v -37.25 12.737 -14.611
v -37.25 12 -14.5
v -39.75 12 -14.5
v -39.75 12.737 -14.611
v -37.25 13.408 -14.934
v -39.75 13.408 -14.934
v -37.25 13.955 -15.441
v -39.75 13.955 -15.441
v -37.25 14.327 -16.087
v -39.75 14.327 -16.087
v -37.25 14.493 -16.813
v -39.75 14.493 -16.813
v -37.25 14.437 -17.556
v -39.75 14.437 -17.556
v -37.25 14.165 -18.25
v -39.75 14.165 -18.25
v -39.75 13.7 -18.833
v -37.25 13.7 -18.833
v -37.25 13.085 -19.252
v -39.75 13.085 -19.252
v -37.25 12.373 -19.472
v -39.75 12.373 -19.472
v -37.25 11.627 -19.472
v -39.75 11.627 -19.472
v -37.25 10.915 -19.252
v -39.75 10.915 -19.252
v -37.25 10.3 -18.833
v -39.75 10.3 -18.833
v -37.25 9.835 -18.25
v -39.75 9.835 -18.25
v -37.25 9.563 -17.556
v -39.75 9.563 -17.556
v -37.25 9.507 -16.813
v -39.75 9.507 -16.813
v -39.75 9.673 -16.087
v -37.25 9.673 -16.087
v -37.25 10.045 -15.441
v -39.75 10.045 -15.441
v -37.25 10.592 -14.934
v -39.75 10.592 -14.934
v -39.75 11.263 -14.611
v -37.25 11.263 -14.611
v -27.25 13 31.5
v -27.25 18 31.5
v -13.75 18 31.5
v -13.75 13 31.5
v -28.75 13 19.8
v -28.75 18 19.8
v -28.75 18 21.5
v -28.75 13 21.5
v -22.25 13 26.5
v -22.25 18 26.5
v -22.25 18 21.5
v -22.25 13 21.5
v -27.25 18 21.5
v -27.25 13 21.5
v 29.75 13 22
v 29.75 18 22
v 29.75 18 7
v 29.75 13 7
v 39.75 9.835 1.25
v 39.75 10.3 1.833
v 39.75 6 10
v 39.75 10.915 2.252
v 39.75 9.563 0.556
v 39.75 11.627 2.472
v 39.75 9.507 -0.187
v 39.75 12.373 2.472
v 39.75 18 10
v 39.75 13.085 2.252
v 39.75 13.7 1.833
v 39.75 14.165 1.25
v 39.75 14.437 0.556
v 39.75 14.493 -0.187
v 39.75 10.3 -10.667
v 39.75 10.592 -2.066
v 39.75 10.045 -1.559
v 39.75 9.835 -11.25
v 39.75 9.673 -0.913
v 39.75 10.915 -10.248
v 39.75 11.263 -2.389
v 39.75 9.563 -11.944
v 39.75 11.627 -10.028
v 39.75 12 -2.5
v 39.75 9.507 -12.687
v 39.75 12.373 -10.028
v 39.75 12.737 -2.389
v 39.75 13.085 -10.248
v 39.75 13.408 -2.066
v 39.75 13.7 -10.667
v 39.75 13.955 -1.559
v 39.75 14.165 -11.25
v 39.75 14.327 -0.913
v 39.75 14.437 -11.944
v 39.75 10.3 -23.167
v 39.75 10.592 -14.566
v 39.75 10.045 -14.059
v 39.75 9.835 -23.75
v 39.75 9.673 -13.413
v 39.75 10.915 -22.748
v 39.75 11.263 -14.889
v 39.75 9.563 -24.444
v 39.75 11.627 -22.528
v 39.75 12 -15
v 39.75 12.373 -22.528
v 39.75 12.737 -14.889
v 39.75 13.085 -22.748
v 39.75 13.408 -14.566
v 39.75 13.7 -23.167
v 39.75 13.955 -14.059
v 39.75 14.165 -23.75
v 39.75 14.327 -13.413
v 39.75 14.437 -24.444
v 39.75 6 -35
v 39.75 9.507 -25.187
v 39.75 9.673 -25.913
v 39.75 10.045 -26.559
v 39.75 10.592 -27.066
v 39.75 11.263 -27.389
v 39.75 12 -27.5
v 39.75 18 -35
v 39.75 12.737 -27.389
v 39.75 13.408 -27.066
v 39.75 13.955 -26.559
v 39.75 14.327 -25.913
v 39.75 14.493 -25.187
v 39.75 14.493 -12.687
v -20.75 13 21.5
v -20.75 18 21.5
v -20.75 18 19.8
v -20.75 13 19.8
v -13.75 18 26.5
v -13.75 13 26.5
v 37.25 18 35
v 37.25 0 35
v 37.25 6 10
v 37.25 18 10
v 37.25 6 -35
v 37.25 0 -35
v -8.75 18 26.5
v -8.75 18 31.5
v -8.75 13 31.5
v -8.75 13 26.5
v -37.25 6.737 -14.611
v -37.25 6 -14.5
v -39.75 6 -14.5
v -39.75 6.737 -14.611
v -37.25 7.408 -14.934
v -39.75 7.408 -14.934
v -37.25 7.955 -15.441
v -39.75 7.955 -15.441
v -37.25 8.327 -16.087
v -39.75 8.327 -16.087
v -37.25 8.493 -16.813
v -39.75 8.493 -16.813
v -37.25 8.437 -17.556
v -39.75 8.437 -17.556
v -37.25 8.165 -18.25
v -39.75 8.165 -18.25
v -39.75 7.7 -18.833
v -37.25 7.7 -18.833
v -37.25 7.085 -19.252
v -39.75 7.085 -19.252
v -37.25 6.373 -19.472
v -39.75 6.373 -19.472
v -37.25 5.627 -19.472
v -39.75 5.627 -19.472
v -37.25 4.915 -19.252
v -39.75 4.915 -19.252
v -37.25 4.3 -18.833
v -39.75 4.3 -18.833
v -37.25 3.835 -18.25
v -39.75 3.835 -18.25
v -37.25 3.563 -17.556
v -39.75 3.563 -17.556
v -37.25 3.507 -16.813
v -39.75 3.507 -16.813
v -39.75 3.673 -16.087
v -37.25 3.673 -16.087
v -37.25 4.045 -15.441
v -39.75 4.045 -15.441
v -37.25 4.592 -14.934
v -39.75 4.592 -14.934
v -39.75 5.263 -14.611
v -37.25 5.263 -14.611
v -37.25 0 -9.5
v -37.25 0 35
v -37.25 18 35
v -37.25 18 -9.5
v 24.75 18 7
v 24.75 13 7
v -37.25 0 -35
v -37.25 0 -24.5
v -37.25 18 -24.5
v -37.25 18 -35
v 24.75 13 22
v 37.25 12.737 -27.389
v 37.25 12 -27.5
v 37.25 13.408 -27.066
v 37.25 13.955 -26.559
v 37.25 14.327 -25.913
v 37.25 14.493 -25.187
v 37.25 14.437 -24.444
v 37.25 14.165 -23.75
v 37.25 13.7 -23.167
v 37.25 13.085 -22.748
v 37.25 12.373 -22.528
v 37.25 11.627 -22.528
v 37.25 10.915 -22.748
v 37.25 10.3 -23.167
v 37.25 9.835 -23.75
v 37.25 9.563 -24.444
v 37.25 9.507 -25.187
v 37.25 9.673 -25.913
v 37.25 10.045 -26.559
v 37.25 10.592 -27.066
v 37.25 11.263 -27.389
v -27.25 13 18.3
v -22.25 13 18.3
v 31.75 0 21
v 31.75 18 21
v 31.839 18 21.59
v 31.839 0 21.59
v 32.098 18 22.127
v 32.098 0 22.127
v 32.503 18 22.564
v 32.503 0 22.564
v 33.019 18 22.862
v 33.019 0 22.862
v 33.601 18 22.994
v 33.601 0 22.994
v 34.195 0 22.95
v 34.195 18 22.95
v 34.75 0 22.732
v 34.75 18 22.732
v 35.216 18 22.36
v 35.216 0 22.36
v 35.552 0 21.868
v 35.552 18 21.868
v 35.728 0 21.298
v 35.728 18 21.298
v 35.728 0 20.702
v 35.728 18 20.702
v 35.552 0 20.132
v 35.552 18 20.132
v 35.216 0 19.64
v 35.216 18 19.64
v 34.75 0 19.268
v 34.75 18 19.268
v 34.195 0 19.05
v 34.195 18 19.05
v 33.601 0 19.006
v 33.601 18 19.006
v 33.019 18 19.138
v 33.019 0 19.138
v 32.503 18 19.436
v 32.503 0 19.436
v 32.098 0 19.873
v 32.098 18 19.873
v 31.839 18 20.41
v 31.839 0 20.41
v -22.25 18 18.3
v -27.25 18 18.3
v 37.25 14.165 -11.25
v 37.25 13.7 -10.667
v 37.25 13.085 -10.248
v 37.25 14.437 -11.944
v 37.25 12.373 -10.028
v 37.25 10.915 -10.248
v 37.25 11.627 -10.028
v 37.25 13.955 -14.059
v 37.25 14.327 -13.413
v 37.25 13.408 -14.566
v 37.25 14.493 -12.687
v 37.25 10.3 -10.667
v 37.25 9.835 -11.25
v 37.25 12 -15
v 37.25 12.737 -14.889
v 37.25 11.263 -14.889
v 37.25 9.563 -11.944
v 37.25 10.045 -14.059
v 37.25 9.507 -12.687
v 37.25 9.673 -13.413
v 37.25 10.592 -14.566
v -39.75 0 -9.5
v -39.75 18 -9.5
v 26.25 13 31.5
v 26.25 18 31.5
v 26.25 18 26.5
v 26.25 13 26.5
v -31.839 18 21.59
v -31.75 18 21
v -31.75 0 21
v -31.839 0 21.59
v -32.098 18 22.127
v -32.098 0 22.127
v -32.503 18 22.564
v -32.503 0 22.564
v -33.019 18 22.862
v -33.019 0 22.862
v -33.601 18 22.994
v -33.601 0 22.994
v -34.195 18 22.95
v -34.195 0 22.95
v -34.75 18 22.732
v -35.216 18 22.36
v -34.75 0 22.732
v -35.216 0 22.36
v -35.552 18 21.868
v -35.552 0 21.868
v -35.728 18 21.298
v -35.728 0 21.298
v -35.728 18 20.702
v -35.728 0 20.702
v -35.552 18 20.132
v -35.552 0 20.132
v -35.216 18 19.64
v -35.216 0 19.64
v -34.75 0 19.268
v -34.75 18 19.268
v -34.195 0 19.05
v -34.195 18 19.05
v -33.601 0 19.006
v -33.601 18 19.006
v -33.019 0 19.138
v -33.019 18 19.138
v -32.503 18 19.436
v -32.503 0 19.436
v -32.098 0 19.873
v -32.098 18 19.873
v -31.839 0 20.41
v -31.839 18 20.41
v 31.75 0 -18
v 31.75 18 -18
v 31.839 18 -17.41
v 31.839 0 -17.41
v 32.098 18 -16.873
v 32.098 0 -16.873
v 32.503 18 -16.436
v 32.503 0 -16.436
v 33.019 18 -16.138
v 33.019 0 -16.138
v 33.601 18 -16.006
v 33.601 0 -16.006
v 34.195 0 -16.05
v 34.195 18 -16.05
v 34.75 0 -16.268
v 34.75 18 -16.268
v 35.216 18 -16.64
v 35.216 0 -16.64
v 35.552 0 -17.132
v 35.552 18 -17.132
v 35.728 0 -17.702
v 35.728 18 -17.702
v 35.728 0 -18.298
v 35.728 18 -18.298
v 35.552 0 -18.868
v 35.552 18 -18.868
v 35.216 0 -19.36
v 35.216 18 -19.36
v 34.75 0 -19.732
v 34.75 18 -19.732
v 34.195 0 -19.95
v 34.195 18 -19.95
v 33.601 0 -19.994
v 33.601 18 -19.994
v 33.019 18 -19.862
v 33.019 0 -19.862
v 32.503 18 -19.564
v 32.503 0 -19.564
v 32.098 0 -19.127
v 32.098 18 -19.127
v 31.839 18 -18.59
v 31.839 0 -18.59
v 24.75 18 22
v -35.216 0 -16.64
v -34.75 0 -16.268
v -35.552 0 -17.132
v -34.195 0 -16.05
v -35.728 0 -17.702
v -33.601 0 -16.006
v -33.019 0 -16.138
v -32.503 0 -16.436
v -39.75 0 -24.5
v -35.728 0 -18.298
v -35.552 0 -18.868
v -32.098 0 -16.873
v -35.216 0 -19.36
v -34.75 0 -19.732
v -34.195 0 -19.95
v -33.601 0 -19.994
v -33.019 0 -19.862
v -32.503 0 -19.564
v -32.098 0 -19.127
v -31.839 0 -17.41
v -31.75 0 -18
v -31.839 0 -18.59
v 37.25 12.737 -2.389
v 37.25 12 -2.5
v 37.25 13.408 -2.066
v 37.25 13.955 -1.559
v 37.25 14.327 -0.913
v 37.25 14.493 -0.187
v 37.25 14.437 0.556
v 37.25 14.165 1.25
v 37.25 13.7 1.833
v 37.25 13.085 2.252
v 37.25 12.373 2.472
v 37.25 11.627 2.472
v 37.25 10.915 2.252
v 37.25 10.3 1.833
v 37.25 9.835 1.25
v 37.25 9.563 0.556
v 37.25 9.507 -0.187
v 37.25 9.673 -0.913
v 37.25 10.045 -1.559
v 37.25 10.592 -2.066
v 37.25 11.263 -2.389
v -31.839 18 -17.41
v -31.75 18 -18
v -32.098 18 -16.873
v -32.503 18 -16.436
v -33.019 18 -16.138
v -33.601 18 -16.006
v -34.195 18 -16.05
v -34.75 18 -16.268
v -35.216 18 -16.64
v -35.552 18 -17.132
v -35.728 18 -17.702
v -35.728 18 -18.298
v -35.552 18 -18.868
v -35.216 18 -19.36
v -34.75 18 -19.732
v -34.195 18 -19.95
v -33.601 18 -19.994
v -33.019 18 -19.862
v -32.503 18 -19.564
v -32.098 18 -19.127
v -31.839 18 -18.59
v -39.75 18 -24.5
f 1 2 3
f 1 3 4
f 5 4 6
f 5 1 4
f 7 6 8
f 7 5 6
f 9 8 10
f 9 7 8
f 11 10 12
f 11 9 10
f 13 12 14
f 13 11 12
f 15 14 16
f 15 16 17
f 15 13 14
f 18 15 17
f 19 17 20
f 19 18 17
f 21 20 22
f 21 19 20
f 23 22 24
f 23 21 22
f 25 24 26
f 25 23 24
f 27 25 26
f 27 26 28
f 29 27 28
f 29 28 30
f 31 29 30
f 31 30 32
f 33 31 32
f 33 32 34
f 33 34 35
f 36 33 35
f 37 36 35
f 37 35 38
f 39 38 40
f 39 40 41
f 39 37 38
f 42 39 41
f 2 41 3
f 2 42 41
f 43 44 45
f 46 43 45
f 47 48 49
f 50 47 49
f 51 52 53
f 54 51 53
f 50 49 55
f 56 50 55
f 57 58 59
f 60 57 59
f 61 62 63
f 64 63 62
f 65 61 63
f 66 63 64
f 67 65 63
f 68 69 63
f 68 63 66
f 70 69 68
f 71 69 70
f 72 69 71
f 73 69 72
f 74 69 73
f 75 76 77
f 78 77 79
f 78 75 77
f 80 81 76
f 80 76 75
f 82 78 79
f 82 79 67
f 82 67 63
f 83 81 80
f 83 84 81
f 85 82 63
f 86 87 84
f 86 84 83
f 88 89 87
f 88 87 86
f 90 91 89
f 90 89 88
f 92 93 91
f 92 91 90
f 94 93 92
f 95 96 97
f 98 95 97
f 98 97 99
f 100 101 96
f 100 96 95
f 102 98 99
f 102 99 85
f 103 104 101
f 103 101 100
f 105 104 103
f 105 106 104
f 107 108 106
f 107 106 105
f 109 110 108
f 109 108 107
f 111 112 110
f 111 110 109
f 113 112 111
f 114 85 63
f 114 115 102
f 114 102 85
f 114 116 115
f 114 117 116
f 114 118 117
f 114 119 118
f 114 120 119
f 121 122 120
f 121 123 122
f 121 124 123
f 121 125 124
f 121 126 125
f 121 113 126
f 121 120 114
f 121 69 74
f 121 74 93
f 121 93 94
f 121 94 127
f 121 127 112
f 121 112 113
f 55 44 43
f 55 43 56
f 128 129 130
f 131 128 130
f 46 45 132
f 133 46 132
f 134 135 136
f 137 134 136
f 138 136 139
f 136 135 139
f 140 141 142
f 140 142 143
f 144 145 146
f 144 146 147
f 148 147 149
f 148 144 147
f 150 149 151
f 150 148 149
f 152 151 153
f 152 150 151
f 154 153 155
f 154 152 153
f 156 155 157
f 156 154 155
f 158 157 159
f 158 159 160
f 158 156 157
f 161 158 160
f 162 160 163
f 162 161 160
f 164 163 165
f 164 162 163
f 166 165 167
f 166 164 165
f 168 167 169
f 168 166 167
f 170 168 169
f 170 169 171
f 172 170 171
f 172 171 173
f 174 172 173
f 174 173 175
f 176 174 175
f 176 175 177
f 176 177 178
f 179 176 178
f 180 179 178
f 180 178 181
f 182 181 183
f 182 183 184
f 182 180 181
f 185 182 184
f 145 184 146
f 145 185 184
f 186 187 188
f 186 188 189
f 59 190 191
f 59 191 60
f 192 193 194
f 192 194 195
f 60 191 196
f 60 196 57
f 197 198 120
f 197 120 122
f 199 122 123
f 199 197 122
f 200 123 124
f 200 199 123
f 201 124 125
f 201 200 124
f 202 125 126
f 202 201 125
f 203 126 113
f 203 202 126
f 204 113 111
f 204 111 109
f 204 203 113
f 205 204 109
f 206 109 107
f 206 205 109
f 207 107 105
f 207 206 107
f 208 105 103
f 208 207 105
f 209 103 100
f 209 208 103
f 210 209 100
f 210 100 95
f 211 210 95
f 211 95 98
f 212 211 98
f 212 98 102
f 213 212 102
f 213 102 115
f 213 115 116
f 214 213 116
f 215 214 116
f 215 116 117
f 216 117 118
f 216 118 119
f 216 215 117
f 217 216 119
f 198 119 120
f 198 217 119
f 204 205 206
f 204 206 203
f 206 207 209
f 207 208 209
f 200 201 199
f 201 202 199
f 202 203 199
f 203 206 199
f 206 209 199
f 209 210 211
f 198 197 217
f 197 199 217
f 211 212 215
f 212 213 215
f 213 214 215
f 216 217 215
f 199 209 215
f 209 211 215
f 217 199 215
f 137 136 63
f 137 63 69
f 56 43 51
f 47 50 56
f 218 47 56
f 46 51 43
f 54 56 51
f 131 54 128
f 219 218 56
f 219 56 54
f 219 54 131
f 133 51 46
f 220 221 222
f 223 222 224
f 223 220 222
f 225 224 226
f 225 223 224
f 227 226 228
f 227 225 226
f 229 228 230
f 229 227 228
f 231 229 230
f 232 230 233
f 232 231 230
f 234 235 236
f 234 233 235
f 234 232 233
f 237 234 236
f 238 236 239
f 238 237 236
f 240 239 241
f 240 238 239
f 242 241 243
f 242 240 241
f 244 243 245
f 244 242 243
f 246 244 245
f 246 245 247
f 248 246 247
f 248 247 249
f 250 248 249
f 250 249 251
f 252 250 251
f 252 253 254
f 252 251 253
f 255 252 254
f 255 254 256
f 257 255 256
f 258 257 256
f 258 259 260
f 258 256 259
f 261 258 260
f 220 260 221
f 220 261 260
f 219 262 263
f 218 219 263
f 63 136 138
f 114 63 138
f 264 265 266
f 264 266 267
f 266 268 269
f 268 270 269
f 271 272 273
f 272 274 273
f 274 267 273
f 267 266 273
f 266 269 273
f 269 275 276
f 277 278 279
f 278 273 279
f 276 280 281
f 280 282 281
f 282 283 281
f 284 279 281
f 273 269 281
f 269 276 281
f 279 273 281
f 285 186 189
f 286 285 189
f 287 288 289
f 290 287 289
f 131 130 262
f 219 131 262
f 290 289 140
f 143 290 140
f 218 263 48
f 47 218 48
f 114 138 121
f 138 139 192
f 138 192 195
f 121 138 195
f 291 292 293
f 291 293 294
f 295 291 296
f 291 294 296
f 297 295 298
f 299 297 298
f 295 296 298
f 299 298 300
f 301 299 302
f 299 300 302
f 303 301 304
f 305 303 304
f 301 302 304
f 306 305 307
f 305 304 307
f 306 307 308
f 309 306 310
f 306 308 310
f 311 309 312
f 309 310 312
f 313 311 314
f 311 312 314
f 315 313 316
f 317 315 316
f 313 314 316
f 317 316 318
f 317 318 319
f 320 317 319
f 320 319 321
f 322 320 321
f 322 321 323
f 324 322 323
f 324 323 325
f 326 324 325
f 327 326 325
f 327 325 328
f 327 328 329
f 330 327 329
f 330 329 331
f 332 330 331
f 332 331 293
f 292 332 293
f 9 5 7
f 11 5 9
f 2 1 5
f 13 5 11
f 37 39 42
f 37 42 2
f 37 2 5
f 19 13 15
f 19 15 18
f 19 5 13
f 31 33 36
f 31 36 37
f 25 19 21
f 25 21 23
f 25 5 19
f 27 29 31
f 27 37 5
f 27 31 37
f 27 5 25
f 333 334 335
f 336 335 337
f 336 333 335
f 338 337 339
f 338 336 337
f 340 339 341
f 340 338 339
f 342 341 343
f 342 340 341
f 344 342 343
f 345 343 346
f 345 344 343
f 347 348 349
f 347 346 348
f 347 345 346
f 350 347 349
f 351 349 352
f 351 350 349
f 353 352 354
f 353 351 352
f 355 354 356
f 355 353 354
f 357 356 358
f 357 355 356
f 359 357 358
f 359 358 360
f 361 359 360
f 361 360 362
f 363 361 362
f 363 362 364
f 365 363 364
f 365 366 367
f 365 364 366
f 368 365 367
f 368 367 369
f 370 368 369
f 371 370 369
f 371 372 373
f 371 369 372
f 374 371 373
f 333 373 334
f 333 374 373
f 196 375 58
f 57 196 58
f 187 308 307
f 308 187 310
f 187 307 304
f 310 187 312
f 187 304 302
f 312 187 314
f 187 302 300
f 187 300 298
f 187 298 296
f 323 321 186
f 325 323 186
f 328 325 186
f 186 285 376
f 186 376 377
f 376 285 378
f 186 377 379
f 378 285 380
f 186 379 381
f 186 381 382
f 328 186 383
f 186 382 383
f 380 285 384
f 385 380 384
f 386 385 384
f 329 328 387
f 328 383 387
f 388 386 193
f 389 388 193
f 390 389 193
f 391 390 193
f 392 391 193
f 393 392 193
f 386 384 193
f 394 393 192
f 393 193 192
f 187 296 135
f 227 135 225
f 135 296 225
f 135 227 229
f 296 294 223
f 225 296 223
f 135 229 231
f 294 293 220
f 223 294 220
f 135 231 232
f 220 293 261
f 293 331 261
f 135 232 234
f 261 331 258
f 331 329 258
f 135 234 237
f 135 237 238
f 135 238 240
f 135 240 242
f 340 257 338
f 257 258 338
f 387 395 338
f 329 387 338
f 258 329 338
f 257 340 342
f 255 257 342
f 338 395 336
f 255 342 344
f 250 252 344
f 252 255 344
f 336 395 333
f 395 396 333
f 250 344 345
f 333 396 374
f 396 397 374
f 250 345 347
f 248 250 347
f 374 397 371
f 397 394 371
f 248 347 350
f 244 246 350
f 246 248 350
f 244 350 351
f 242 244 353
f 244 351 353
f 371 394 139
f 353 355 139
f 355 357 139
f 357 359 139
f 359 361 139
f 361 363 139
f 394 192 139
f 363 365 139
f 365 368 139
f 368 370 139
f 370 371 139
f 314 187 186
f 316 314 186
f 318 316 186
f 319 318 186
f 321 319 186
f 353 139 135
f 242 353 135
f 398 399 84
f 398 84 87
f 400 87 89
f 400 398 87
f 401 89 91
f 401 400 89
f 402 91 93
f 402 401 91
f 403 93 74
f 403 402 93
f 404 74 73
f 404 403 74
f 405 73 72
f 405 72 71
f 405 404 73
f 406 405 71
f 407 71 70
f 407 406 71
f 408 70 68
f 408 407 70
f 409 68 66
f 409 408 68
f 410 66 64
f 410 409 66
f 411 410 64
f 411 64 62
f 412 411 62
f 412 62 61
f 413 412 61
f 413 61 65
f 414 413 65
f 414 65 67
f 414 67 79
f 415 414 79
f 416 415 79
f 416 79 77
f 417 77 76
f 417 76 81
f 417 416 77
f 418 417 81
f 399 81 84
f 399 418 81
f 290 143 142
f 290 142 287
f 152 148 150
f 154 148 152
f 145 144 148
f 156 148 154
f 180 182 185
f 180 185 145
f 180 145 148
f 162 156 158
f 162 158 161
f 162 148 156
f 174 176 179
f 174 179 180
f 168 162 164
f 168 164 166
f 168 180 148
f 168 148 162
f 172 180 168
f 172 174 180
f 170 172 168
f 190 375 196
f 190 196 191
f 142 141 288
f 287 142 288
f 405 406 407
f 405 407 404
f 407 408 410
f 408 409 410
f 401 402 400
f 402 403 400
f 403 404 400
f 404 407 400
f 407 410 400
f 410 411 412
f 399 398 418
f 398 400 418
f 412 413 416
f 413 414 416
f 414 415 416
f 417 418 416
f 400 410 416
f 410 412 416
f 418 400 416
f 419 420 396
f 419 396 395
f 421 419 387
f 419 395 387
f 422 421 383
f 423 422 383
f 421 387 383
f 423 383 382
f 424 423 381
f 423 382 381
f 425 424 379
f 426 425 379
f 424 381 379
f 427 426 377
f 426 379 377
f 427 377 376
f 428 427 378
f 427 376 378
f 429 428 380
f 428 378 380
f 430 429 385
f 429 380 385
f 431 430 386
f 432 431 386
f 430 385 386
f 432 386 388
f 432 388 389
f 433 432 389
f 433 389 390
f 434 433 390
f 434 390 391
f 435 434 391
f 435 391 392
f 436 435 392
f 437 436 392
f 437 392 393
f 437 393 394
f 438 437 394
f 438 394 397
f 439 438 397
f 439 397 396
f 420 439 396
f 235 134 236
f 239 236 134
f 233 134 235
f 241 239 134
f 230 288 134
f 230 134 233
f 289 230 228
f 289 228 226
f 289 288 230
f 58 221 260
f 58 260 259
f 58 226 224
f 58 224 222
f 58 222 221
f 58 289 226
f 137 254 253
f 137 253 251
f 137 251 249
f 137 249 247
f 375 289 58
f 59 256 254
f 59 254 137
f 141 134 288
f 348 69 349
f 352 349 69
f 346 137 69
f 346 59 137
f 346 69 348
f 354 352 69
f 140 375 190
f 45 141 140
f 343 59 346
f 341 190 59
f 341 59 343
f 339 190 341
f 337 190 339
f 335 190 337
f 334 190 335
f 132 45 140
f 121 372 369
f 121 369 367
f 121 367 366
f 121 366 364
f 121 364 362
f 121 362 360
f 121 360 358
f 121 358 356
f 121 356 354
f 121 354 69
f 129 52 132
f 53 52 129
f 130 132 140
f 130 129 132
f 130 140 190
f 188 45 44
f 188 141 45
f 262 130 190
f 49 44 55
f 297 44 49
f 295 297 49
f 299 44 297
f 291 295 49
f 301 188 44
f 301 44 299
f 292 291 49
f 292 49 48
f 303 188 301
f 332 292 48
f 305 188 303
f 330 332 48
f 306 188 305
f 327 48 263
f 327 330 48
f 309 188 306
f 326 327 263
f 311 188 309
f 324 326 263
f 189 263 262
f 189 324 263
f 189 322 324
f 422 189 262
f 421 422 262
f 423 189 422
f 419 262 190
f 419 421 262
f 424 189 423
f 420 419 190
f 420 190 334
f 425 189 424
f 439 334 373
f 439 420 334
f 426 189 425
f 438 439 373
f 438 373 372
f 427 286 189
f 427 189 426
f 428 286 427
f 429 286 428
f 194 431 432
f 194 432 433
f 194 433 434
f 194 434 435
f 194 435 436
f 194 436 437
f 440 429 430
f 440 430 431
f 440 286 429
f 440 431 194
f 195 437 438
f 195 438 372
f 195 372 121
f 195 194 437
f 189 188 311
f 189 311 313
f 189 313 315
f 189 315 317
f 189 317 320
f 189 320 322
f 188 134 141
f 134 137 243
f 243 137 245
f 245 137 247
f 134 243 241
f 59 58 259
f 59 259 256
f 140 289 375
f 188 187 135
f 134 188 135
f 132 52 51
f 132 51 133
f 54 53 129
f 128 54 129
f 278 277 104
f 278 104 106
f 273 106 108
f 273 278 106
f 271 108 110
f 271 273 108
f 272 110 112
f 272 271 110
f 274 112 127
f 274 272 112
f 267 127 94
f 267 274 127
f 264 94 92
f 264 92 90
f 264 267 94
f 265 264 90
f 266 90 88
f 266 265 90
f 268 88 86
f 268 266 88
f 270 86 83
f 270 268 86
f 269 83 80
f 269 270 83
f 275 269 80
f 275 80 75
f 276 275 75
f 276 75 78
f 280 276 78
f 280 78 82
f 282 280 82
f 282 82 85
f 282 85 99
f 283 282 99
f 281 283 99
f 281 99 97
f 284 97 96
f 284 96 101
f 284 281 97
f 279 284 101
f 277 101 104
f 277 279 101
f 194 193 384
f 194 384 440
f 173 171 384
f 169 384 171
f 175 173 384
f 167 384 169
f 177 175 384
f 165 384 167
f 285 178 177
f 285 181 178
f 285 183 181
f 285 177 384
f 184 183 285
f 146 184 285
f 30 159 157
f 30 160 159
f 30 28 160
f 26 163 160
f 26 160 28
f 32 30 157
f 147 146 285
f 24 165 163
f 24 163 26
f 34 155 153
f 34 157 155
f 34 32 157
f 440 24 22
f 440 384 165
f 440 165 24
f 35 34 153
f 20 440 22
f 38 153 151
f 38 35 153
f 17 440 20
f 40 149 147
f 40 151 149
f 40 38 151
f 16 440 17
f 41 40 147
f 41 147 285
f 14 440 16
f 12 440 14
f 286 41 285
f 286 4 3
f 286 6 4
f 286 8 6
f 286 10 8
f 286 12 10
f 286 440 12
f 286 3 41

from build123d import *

# Parameters (mm, degrees)
SKETCH1_W           = 74.5
SKETCH1_H           = 70
BOSS_EXTRUDE1_DEPTH = 18
SKETCH3_W           = 5
SKETCH3_H           = 10
SKETCH3_W_2         = 8.5
SKETCH3_H_2         = 5
SKETCH3_W_3         = 18.5
SKETCH3_W_4         = 16.5
SKETCH3_H_3         = 15
CUT_EXTRUDE1_DEPTH  = 5
SKETCH4_W           = 45
SKETCH4_H           = 12
SKETCH4_R           = 2.5
BOSS_EXTRUDE2_DEPTH = 2.5
SKETCH5_W           = 15
SKETCH5_H           = 18
SKETCH5_R           = 2.5
BOSS_EXTRUDE3_DEPTH = 2.5
SKETCH6_R           = 2
CUT_EXTRUDE2_DEPTH  = 19


with BuildPart() as part:
    # Sketch1 → Boss-Extrude1 (new body)
    with BuildSketch(Plane(origin=(0, 0, 0), x_dir=(1, 0, 0), z_dir=(0, 1, 0))):
        Rectangle(SKETCH1_W, SKETCH1_H)
    extrude(amount=BOSS_EXTRUDE1_DEPTH)

    # Sketch3 → Cut-Extrude1 (cut)
    with BuildSketch(Plane(origin=(0, 18, 0), x_dir=(1, 0, 0), z_dir=(0, 1, 0))):
        with Locations((-24.75, -26.5)):
            Rectangle(SKETCH3_W, SKETCH3_H)
        with Locations((-18, -29)):
            Rectangle(SKETCH3_W_2, SKETCH3_H_2)
        Polygon((-28.75, -21.5), (-27.25, -21.5), (-22.25, -21.5), (-20.75, -21.5), (-20.75, -19.8), (-22.25, -18.3), (-27.25, -18.3), (-28.75, -19.8), align=None)
        with Locations((0.5, -29)):
            Rectangle(SKETCH3_W_3, SKETCH3_H_2)
        with Locations((18, -29)):
            Rectangle(SKETCH3_W_4, SKETCH3_H_2)
        with Locations((27.25, -14.5)):
            Rectangle(SKETCH3_W, SKETCH3_H_3)
    extrude(amount=-CUT_EXTRUDE1_DEPTH, mode=Mode.SUBTRACT)

    # Sketch4 → Boss-Extrude2 (add)
    with BuildSketch(Plane(origin=(37.25, 0, 0), x_dir=(0, 0, -1), z_dir=(1, 0, 0))):
        with Locations((12.5, 12)):
            Rectangle(SKETCH4_W, SKETCH4_H)
        with Locations((25, 12)):
            Circle(SKETCH4_R, mode=Mode.SUBTRACT)
        with Locations((12.5, 12)):
            Circle(SKETCH4_R, mode=Mode.SUBTRACT)
        with Locations((0, 12)):
            Circle(SKETCH4_R, mode=Mode.SUBTRACT)
    extrude(amount=BOSS_EXTRUDE2_DEPTH)

    # Sketch5 → Boss-Extrude3 (add)
    with BuildSketch(Plane.ZY.offset(37.25)):
        with Locations((-17, 9)):
            Rectangle(SKETCH5_W, SKETCH5_H)
        with Locations((-17, 12)):
            Circle(SKETCH5_R, mode=Mode.SUBTRACT)
        with Locations((-17, 6)):
            Circle(SKETCH5_R, mode=Mode.SUBTRACT)
    extrude(amount=BOSS_EXTRUDE3_DEPTH)

    # Sketch6 → Cut-Extrude2 (cut, through all)
    with BuildSketch(Plane.XZ):
        with Locations((-33.75, 21)):
            Circle(SKETCH6_R)
        with Locations((-33.75, -18)):
            Circle(SKETCH6_R)
    cut_extrude2 = extrude(amount=-CUT_EXTRUDE2_DEPTH, mode=Mode.SUBTRACT)

    # Mirror1: Cut-Extrude2 across plane
    add(cut_extrude2.mirror(Plane(origin=(0, 0, 0), x_dir=(0, 0, 1), z_dir=(1, 0, 0))), mode=Mode.SUBTRACT)


solid = part.part
